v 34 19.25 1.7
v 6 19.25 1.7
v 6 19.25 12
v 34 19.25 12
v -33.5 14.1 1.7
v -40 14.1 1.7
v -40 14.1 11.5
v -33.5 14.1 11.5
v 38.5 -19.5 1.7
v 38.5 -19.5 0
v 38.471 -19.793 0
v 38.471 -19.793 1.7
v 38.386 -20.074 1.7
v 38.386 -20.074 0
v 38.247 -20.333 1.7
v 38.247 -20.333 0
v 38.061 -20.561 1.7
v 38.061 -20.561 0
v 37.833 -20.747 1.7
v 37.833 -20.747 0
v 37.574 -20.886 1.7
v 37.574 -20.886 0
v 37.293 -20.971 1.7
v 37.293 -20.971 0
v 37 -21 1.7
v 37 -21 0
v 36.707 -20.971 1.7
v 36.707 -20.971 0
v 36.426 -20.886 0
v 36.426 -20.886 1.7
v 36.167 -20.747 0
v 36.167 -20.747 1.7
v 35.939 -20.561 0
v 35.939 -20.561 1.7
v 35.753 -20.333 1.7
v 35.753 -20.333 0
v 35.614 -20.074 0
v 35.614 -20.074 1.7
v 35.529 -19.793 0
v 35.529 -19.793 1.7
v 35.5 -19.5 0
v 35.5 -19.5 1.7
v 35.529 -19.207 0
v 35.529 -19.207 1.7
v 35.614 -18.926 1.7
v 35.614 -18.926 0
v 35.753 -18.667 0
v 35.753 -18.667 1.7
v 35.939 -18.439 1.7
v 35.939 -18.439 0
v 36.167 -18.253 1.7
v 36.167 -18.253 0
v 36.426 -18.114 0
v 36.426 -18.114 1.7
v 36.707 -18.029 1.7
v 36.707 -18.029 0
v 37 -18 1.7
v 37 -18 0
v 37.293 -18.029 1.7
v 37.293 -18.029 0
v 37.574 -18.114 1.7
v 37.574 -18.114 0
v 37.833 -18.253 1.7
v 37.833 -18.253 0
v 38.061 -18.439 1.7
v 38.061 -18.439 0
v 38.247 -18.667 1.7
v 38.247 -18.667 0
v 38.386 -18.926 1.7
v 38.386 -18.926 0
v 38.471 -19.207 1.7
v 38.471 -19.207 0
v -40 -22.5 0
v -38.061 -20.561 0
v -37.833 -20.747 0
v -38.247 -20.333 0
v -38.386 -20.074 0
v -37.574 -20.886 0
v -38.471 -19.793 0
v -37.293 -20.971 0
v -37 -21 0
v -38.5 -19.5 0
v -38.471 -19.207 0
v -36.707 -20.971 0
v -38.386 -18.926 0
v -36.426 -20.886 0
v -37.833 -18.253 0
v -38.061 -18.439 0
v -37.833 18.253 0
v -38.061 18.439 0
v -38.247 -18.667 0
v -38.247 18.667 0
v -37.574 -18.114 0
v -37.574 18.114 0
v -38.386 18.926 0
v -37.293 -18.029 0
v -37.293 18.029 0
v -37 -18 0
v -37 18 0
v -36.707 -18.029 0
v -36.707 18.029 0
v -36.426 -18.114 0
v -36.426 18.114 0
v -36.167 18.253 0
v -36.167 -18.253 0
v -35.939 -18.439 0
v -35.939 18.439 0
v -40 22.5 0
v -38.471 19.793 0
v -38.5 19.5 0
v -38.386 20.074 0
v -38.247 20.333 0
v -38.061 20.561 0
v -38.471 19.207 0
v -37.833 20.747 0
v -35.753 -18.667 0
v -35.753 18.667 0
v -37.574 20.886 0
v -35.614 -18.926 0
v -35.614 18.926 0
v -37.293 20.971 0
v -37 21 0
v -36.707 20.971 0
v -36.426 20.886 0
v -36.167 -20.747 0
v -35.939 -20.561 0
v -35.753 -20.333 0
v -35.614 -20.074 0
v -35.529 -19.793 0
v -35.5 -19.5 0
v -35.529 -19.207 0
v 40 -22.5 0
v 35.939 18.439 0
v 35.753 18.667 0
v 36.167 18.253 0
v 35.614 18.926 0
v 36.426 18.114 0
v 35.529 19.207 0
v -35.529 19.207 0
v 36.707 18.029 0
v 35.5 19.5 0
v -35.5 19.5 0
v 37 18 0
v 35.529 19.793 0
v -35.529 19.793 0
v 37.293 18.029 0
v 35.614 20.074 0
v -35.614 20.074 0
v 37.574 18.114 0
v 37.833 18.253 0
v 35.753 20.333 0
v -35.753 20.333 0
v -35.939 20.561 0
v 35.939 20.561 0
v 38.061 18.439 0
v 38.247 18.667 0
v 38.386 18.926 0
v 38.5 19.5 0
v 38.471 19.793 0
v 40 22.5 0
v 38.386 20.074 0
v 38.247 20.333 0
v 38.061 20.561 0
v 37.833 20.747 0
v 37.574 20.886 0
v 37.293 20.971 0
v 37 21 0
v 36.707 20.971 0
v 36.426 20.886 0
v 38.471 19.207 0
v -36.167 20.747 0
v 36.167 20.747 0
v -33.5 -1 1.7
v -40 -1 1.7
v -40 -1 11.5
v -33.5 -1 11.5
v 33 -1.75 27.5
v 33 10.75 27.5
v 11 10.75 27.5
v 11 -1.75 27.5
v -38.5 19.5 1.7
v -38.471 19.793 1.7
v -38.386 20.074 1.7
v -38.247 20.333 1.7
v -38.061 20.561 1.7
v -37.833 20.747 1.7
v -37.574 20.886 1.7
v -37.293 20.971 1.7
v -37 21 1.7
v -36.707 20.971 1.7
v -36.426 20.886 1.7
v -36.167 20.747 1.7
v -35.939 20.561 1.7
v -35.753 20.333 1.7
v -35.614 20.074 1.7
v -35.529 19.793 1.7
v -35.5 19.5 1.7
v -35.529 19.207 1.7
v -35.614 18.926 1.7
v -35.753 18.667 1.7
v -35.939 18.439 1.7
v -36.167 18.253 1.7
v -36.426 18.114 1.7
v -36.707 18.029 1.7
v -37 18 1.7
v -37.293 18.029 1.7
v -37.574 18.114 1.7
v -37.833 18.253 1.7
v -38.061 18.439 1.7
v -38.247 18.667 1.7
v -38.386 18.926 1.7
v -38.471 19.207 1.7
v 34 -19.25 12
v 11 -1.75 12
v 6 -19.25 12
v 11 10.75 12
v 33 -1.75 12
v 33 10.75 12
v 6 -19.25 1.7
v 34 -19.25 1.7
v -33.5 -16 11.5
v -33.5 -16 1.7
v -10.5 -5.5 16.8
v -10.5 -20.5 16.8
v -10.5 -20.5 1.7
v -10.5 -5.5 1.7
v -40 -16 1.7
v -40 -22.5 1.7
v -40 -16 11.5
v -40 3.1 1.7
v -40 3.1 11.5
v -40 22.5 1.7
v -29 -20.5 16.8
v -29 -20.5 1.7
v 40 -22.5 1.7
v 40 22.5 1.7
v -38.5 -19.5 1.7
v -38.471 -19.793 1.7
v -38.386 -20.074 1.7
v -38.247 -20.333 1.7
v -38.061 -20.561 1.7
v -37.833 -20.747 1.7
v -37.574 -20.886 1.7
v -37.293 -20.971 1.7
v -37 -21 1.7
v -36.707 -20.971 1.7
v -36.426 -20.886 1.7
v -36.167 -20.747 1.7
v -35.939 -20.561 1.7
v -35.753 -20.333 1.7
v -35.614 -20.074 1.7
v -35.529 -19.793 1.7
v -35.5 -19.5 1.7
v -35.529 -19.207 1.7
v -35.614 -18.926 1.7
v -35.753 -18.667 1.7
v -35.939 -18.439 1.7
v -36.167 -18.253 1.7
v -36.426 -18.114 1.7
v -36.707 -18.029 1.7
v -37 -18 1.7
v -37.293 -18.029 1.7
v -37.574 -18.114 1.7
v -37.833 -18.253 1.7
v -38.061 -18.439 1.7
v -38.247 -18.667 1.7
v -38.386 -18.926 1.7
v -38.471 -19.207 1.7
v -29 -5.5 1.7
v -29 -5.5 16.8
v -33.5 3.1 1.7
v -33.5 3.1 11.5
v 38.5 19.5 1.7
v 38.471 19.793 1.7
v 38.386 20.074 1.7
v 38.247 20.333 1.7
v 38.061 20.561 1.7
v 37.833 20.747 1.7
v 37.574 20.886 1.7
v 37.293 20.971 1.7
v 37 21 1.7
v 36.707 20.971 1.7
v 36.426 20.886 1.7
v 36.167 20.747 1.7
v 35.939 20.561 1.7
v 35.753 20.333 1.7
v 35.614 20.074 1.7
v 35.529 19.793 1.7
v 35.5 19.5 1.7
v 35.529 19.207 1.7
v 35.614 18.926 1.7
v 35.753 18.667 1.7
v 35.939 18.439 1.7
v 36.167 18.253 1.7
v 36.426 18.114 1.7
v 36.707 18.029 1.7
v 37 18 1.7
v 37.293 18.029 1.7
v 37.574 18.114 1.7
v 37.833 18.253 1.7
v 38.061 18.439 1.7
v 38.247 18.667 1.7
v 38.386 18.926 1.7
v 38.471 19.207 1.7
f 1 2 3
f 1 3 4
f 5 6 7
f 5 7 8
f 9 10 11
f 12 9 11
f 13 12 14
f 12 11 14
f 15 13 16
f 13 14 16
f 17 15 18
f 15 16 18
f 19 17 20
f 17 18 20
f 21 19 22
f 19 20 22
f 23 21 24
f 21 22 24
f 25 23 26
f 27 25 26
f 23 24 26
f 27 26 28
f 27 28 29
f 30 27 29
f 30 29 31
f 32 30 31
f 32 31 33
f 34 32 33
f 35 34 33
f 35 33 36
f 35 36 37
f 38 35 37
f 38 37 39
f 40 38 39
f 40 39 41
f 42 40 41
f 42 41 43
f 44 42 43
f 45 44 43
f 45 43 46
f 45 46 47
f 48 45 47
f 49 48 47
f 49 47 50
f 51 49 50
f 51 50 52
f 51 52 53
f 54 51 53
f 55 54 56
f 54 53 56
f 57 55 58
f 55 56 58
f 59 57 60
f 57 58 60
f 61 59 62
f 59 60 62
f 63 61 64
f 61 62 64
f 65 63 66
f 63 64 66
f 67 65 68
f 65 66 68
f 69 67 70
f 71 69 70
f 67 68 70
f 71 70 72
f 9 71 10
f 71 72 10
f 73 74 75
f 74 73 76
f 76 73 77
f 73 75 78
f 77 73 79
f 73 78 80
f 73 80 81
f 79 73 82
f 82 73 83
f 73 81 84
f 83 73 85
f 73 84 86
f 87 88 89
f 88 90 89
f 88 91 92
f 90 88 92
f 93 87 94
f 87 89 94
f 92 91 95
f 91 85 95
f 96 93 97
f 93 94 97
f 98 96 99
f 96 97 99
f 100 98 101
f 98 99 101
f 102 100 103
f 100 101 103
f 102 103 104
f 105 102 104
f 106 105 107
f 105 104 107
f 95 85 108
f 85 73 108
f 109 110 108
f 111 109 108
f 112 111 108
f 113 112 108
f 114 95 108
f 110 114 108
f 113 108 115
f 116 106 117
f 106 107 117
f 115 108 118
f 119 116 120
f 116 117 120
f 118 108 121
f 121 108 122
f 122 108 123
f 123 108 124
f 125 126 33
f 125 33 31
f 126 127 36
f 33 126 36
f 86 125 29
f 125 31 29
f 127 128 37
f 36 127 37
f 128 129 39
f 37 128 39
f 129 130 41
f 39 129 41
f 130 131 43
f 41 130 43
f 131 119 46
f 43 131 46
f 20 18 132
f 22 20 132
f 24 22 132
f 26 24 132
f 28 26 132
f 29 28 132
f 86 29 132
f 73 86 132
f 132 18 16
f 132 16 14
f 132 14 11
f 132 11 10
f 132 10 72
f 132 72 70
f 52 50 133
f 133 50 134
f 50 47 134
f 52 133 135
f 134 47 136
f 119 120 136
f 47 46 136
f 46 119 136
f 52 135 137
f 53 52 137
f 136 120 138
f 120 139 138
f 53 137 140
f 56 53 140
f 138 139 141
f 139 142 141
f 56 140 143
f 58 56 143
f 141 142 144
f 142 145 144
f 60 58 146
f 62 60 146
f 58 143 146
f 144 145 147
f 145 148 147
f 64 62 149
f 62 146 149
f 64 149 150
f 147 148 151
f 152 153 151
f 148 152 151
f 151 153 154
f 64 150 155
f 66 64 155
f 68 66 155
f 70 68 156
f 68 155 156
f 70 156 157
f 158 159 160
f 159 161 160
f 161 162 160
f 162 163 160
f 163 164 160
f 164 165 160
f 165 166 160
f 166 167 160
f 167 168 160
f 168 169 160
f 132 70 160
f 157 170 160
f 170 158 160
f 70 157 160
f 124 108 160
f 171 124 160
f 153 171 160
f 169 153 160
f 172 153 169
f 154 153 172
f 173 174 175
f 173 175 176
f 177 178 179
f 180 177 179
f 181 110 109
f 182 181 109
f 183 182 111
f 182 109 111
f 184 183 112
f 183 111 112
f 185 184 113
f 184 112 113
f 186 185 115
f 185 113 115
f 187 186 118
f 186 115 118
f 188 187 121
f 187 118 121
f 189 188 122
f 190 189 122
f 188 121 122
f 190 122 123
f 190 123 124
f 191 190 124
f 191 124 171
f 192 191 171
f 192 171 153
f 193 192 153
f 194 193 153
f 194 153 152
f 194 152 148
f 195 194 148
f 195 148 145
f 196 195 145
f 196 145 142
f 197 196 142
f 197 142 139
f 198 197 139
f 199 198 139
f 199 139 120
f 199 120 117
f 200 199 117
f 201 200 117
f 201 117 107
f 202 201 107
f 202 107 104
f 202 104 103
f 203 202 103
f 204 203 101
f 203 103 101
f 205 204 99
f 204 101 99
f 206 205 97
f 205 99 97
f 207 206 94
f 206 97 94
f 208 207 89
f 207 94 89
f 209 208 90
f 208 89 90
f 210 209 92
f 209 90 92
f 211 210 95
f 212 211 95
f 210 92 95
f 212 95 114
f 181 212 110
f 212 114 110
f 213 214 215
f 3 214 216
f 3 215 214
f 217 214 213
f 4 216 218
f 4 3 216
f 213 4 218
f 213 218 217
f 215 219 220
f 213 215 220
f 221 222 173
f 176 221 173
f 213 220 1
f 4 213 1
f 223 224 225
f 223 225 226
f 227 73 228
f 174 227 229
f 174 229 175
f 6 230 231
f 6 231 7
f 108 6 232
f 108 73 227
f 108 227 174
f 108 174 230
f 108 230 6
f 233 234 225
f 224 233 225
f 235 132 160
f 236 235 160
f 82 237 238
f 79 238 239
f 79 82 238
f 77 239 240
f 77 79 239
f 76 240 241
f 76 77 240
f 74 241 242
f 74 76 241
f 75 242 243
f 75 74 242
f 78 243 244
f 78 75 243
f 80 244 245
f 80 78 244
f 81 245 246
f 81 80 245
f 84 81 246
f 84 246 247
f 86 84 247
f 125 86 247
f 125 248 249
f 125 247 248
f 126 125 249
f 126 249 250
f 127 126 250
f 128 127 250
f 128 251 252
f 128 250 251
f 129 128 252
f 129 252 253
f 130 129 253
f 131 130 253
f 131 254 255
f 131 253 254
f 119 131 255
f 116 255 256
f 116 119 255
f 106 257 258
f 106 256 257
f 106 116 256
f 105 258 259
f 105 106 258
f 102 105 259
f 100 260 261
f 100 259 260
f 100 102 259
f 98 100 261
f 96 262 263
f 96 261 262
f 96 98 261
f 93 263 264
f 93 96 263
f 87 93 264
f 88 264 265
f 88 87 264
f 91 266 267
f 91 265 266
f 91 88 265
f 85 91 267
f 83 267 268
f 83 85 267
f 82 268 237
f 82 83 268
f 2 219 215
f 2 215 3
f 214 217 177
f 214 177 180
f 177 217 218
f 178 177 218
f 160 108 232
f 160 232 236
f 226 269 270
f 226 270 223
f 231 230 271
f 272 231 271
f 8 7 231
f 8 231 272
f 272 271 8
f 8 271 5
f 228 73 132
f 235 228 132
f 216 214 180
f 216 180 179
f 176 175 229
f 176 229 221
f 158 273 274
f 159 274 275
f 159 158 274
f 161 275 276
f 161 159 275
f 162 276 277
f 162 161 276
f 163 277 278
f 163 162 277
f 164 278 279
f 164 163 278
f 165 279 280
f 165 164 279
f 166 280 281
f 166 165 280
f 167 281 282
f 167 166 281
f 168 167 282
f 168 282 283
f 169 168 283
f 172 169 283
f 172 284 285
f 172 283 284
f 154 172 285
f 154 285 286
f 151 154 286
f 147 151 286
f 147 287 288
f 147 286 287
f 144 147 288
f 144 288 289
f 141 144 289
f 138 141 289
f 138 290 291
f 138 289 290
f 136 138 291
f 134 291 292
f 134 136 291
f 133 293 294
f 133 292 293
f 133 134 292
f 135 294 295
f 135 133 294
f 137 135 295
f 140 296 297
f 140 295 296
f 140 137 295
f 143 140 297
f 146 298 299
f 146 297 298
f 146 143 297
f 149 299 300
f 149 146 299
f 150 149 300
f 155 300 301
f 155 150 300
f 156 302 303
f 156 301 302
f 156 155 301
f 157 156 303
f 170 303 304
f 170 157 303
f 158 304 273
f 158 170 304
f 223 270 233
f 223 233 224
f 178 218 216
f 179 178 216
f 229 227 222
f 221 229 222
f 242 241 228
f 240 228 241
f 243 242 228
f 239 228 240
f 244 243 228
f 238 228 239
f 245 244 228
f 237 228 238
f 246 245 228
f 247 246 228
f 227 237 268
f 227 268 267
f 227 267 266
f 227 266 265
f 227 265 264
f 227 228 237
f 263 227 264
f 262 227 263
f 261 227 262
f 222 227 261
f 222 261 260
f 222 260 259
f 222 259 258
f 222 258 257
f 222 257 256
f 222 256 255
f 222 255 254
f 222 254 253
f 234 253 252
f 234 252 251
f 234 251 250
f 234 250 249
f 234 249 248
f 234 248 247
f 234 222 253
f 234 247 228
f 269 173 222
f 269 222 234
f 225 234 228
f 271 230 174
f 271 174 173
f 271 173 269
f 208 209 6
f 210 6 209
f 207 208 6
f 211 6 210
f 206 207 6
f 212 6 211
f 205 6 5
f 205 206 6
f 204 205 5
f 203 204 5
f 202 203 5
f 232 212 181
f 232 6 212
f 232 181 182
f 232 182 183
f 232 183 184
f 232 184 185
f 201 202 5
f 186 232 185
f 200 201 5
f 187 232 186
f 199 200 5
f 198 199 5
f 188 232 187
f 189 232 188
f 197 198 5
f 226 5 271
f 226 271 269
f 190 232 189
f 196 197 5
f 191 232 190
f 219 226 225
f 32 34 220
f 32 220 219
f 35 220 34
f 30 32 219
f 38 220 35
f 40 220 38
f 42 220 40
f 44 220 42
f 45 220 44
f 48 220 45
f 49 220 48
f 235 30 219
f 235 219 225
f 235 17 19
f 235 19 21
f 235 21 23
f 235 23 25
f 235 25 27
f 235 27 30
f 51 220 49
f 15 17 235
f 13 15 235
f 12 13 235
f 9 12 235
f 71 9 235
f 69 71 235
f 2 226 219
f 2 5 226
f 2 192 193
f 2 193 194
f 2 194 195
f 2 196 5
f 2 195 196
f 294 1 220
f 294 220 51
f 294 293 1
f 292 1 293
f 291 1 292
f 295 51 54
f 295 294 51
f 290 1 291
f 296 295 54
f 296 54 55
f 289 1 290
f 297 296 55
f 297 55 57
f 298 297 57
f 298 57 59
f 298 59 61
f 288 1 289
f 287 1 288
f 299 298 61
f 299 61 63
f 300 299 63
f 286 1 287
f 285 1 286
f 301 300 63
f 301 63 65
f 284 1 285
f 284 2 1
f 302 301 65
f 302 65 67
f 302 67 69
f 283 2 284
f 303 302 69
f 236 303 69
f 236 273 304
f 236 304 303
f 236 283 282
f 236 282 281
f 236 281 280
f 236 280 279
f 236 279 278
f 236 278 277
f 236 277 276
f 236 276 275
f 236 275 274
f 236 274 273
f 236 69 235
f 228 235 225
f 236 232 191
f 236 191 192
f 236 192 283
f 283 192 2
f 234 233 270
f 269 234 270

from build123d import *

# Parameters (mm, degrees)
SKETCH_W                  = 80
SKETCH_H                  = 45
PAD_DEPTH                 = 1.7
SKETCH001_W               = 6.5
SKETCH001_H               = 11
PAD001_DEPTH              = 11.5
SKETCH002_W               = 6.5
SKETCH002_H               = 15
PAD002_DEPTH              = 11.5
SKETCH003_W               = 18.5
SKETCH003_H               = 15
PAD003_DEPTH              = 16.8
CYLINDER_R                = 1.5
CYLINDER_DEPTH            = 10
CYLINDER_MIRRORED_2_R     = 1.5
CYLINDER_MIRRORED_2_DEPTH = 10
SKETCH034_W               = 28
SKETCH034_H               = 38.5
PAD017_DEPTH              = 12
SKETCH035_W               = 22
SKETCH035_H               = 12.5
PAD018_DEPTH              = 15.5


with BuildPart() as part:
    # Sketch → Pad (new body)
    with BuildSketch(Plane.XY):
        Rectangle(SKETCH_W, SKETCH_H)
    extrude(amount=PAD_DEPTH)

    # Sketch001 → Pad001 (join)
    with BuildSketch(Plane.XY):
        with Locations((-36.75, 8.6)):
            Rectangle(SKETCH001_W, SKETCH001_H)
    extrude(amount=PAD001_DEPTH)

    # Sketch002 → Pad002 (join)
    with BuildSketch(Plane.XY):
        with Locations((-36.75, -8.5)):
            Rectangle(SKETCH002_W, SKETCH002_H)
    extrude(amount=PAD002_DEPTH)

    # Sketch003 → Pad003 (join)
    with BuildSketch(Plane.XY):
        with Locations((-19.75, -13)):
            Rectangle(SKETCH003_W, SKETCH003_H)
    extrude(amount=PAD003_DEPTH)

    # Cylinder → Cylinder (cut)
    with BuildSketch(Plane(origin=(37, 19.5, 0), x_dir=(1, 0, 0), z_dir=(0, 0, 1))):
        Circle(CYLINDER_R)
    cylinder = extrude(amount=CYLINDER_DEPTH, mode=Mode.SUBTRACT)

    # Cylinder Mirrored 2 → Cylinder Mirrored 2 (cut)
    with BuildSketch(Plane(origin=(-37, 19.5, 0), x_dir=(-1, 0, 0), z_dir=(0, 0, -1))):
        Circle(CYLINDER_MIRRORED_2_R)
    cylinder_mirrored_2 = extrude(amount=-CYLINDER_MIRRORED_2_DEPTH, mode=Mode.SUBTRACT)

    # Mirrored001: Cylinder, Cylinder Mirrored 2 across XZ
    add(cylinder.mirror(Plane.XZ), mode=Mode.SUBTRACT)
    add(cylinder_mirrored_2.mirror(Plane.XZ), mode=Mode.SUBTRACT)

    # Sketch034 → Pad017 (join)
    with BuildSketch(Plane.XY):
        with Locations((20, 0)):
            Rectangle(SKETCH034_W, SKETCH034_H)
    extrude(amount=PAD017_DEPTH)

    # Sketch035 (on Local_CS) → Pad018 (join)
    with BuildSketch(Plane(origin=(22, 4.5, 12), x_dir=(-1, 0, 0), z_dir=(0, 0, -1))):
        Rectangle(SKETCH035_W, SKETCH035_H)
    extrude(amount=-PAD018_DEPTH)


solid = part.part
